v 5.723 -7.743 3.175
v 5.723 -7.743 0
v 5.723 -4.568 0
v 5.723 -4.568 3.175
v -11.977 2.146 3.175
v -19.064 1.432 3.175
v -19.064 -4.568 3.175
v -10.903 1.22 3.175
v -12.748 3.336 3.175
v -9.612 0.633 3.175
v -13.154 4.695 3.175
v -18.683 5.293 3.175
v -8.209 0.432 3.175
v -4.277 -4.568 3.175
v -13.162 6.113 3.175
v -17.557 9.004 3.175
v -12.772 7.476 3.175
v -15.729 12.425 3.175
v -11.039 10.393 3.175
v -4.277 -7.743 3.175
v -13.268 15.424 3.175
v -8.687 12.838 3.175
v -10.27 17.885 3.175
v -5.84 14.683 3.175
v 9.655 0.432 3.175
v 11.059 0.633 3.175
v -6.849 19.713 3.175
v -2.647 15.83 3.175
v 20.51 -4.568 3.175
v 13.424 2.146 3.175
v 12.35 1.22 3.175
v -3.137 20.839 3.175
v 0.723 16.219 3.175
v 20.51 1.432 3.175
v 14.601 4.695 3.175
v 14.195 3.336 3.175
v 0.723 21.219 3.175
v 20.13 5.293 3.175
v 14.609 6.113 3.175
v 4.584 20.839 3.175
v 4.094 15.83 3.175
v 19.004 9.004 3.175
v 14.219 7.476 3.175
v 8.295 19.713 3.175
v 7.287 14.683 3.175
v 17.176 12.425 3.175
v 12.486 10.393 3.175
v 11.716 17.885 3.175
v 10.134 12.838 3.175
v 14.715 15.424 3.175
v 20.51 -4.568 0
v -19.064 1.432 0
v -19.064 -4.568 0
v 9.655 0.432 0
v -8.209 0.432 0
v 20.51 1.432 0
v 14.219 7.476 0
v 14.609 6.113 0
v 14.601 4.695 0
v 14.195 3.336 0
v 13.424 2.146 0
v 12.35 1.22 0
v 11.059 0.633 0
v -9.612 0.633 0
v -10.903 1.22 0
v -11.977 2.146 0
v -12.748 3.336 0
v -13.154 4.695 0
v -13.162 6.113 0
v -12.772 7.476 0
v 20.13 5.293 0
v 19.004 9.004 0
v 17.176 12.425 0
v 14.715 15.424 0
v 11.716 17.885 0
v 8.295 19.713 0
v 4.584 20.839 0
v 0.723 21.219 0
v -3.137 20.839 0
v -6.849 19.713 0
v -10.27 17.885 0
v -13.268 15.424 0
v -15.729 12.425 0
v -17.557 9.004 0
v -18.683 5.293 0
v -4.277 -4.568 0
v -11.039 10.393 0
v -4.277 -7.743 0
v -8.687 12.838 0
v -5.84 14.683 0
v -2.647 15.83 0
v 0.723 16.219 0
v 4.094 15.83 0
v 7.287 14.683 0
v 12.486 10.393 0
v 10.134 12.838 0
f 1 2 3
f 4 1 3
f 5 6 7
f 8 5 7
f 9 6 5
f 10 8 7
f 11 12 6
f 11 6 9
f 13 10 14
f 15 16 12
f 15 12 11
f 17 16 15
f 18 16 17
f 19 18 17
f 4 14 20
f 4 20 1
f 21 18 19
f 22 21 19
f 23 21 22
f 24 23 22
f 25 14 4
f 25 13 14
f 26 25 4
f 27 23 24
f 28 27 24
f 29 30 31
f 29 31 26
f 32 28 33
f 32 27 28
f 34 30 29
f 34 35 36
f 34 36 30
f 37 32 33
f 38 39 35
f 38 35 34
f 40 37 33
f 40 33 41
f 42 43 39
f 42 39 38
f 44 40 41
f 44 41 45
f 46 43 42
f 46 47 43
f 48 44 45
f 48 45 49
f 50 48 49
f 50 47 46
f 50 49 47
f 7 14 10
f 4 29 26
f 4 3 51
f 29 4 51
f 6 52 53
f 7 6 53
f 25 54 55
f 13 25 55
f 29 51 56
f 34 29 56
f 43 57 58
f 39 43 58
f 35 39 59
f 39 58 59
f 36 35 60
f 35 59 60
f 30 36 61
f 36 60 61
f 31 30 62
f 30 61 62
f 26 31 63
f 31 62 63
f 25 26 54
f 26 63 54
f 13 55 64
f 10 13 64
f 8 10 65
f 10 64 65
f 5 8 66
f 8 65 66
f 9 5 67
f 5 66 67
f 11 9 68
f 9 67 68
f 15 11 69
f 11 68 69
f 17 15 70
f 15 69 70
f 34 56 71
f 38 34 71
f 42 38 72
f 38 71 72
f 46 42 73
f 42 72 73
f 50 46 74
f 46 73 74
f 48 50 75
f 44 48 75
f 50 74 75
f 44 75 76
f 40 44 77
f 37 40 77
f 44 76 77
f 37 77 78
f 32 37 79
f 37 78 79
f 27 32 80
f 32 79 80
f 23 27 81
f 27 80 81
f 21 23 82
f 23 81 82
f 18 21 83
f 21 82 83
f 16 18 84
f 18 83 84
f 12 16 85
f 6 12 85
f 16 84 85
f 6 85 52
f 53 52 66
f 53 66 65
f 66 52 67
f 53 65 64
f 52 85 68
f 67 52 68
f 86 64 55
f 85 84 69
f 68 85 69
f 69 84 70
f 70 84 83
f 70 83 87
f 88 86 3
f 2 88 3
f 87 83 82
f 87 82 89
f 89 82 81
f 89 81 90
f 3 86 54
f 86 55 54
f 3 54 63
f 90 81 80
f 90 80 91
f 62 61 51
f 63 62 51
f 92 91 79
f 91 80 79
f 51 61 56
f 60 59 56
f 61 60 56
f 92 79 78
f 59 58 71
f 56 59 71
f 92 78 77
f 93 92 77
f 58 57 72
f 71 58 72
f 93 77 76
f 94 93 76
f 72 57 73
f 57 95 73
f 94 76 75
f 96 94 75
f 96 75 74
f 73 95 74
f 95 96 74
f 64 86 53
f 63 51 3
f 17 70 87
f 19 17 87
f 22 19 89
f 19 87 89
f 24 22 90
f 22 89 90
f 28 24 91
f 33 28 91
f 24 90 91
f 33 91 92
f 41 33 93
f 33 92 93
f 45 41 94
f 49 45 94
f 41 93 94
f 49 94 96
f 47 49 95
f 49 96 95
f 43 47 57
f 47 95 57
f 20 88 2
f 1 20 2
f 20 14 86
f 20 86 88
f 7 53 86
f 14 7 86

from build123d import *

# Parameters (mm, degrees)
F1_DEPTH = 3.175


with BuildPart() as f1:
    # F0 (on Top) → F1 (new body)
    with BuildSketch(Plane.XY):
        with BuildLine():
            Line((-19.06356, 1.432344), (-19.06356, -4.567656))
            Line((-19.06356, -4.567656), (-4.276681, -4.567656))
            Line((-4.276681, -4.567656), (-4.276681, -7.742656))
            Line((-4.276681, -7.742656), (5.723319, -7.742656))
            Line((5.723319, -7.742656), (5.723319, -4.567656))
            Line((5.723319, -4.567656), (20.510198, -4.567656))
            Line((20.510198, -4.567656), (20.510198, 1.432344))
            ThreePointArc((20.510198, 1.432344), (0.723319, 21.219223), (-19.06356, 1.432344))
        make_face()
        with BuildLine():
            Line((9.655452, 0.432344), (5.723319, 0.432344))
            Line((5.723319, 0.432344), (-4.276681, 0.432344))
            Line((-4.276681, 0.432344), (-8.208814, 0.432344))
            ThreePointArc((-8.208814, 0.432344), (-12.405108, 2.713683), (-12.772135, 7.475896))
            ThreePointArc((-12.772135, 7.475896), (0.723319, 16.219223), (14.218773, 7.475896))
            ThreePointArc((14.218773, 7.475896), (13.851746, 2.713683), (9.655452, 0.432344))
        make_face(mode=Mode.SUBTRACT)
    extrude(amount=F1_DEPTH)


solid = f1.part
